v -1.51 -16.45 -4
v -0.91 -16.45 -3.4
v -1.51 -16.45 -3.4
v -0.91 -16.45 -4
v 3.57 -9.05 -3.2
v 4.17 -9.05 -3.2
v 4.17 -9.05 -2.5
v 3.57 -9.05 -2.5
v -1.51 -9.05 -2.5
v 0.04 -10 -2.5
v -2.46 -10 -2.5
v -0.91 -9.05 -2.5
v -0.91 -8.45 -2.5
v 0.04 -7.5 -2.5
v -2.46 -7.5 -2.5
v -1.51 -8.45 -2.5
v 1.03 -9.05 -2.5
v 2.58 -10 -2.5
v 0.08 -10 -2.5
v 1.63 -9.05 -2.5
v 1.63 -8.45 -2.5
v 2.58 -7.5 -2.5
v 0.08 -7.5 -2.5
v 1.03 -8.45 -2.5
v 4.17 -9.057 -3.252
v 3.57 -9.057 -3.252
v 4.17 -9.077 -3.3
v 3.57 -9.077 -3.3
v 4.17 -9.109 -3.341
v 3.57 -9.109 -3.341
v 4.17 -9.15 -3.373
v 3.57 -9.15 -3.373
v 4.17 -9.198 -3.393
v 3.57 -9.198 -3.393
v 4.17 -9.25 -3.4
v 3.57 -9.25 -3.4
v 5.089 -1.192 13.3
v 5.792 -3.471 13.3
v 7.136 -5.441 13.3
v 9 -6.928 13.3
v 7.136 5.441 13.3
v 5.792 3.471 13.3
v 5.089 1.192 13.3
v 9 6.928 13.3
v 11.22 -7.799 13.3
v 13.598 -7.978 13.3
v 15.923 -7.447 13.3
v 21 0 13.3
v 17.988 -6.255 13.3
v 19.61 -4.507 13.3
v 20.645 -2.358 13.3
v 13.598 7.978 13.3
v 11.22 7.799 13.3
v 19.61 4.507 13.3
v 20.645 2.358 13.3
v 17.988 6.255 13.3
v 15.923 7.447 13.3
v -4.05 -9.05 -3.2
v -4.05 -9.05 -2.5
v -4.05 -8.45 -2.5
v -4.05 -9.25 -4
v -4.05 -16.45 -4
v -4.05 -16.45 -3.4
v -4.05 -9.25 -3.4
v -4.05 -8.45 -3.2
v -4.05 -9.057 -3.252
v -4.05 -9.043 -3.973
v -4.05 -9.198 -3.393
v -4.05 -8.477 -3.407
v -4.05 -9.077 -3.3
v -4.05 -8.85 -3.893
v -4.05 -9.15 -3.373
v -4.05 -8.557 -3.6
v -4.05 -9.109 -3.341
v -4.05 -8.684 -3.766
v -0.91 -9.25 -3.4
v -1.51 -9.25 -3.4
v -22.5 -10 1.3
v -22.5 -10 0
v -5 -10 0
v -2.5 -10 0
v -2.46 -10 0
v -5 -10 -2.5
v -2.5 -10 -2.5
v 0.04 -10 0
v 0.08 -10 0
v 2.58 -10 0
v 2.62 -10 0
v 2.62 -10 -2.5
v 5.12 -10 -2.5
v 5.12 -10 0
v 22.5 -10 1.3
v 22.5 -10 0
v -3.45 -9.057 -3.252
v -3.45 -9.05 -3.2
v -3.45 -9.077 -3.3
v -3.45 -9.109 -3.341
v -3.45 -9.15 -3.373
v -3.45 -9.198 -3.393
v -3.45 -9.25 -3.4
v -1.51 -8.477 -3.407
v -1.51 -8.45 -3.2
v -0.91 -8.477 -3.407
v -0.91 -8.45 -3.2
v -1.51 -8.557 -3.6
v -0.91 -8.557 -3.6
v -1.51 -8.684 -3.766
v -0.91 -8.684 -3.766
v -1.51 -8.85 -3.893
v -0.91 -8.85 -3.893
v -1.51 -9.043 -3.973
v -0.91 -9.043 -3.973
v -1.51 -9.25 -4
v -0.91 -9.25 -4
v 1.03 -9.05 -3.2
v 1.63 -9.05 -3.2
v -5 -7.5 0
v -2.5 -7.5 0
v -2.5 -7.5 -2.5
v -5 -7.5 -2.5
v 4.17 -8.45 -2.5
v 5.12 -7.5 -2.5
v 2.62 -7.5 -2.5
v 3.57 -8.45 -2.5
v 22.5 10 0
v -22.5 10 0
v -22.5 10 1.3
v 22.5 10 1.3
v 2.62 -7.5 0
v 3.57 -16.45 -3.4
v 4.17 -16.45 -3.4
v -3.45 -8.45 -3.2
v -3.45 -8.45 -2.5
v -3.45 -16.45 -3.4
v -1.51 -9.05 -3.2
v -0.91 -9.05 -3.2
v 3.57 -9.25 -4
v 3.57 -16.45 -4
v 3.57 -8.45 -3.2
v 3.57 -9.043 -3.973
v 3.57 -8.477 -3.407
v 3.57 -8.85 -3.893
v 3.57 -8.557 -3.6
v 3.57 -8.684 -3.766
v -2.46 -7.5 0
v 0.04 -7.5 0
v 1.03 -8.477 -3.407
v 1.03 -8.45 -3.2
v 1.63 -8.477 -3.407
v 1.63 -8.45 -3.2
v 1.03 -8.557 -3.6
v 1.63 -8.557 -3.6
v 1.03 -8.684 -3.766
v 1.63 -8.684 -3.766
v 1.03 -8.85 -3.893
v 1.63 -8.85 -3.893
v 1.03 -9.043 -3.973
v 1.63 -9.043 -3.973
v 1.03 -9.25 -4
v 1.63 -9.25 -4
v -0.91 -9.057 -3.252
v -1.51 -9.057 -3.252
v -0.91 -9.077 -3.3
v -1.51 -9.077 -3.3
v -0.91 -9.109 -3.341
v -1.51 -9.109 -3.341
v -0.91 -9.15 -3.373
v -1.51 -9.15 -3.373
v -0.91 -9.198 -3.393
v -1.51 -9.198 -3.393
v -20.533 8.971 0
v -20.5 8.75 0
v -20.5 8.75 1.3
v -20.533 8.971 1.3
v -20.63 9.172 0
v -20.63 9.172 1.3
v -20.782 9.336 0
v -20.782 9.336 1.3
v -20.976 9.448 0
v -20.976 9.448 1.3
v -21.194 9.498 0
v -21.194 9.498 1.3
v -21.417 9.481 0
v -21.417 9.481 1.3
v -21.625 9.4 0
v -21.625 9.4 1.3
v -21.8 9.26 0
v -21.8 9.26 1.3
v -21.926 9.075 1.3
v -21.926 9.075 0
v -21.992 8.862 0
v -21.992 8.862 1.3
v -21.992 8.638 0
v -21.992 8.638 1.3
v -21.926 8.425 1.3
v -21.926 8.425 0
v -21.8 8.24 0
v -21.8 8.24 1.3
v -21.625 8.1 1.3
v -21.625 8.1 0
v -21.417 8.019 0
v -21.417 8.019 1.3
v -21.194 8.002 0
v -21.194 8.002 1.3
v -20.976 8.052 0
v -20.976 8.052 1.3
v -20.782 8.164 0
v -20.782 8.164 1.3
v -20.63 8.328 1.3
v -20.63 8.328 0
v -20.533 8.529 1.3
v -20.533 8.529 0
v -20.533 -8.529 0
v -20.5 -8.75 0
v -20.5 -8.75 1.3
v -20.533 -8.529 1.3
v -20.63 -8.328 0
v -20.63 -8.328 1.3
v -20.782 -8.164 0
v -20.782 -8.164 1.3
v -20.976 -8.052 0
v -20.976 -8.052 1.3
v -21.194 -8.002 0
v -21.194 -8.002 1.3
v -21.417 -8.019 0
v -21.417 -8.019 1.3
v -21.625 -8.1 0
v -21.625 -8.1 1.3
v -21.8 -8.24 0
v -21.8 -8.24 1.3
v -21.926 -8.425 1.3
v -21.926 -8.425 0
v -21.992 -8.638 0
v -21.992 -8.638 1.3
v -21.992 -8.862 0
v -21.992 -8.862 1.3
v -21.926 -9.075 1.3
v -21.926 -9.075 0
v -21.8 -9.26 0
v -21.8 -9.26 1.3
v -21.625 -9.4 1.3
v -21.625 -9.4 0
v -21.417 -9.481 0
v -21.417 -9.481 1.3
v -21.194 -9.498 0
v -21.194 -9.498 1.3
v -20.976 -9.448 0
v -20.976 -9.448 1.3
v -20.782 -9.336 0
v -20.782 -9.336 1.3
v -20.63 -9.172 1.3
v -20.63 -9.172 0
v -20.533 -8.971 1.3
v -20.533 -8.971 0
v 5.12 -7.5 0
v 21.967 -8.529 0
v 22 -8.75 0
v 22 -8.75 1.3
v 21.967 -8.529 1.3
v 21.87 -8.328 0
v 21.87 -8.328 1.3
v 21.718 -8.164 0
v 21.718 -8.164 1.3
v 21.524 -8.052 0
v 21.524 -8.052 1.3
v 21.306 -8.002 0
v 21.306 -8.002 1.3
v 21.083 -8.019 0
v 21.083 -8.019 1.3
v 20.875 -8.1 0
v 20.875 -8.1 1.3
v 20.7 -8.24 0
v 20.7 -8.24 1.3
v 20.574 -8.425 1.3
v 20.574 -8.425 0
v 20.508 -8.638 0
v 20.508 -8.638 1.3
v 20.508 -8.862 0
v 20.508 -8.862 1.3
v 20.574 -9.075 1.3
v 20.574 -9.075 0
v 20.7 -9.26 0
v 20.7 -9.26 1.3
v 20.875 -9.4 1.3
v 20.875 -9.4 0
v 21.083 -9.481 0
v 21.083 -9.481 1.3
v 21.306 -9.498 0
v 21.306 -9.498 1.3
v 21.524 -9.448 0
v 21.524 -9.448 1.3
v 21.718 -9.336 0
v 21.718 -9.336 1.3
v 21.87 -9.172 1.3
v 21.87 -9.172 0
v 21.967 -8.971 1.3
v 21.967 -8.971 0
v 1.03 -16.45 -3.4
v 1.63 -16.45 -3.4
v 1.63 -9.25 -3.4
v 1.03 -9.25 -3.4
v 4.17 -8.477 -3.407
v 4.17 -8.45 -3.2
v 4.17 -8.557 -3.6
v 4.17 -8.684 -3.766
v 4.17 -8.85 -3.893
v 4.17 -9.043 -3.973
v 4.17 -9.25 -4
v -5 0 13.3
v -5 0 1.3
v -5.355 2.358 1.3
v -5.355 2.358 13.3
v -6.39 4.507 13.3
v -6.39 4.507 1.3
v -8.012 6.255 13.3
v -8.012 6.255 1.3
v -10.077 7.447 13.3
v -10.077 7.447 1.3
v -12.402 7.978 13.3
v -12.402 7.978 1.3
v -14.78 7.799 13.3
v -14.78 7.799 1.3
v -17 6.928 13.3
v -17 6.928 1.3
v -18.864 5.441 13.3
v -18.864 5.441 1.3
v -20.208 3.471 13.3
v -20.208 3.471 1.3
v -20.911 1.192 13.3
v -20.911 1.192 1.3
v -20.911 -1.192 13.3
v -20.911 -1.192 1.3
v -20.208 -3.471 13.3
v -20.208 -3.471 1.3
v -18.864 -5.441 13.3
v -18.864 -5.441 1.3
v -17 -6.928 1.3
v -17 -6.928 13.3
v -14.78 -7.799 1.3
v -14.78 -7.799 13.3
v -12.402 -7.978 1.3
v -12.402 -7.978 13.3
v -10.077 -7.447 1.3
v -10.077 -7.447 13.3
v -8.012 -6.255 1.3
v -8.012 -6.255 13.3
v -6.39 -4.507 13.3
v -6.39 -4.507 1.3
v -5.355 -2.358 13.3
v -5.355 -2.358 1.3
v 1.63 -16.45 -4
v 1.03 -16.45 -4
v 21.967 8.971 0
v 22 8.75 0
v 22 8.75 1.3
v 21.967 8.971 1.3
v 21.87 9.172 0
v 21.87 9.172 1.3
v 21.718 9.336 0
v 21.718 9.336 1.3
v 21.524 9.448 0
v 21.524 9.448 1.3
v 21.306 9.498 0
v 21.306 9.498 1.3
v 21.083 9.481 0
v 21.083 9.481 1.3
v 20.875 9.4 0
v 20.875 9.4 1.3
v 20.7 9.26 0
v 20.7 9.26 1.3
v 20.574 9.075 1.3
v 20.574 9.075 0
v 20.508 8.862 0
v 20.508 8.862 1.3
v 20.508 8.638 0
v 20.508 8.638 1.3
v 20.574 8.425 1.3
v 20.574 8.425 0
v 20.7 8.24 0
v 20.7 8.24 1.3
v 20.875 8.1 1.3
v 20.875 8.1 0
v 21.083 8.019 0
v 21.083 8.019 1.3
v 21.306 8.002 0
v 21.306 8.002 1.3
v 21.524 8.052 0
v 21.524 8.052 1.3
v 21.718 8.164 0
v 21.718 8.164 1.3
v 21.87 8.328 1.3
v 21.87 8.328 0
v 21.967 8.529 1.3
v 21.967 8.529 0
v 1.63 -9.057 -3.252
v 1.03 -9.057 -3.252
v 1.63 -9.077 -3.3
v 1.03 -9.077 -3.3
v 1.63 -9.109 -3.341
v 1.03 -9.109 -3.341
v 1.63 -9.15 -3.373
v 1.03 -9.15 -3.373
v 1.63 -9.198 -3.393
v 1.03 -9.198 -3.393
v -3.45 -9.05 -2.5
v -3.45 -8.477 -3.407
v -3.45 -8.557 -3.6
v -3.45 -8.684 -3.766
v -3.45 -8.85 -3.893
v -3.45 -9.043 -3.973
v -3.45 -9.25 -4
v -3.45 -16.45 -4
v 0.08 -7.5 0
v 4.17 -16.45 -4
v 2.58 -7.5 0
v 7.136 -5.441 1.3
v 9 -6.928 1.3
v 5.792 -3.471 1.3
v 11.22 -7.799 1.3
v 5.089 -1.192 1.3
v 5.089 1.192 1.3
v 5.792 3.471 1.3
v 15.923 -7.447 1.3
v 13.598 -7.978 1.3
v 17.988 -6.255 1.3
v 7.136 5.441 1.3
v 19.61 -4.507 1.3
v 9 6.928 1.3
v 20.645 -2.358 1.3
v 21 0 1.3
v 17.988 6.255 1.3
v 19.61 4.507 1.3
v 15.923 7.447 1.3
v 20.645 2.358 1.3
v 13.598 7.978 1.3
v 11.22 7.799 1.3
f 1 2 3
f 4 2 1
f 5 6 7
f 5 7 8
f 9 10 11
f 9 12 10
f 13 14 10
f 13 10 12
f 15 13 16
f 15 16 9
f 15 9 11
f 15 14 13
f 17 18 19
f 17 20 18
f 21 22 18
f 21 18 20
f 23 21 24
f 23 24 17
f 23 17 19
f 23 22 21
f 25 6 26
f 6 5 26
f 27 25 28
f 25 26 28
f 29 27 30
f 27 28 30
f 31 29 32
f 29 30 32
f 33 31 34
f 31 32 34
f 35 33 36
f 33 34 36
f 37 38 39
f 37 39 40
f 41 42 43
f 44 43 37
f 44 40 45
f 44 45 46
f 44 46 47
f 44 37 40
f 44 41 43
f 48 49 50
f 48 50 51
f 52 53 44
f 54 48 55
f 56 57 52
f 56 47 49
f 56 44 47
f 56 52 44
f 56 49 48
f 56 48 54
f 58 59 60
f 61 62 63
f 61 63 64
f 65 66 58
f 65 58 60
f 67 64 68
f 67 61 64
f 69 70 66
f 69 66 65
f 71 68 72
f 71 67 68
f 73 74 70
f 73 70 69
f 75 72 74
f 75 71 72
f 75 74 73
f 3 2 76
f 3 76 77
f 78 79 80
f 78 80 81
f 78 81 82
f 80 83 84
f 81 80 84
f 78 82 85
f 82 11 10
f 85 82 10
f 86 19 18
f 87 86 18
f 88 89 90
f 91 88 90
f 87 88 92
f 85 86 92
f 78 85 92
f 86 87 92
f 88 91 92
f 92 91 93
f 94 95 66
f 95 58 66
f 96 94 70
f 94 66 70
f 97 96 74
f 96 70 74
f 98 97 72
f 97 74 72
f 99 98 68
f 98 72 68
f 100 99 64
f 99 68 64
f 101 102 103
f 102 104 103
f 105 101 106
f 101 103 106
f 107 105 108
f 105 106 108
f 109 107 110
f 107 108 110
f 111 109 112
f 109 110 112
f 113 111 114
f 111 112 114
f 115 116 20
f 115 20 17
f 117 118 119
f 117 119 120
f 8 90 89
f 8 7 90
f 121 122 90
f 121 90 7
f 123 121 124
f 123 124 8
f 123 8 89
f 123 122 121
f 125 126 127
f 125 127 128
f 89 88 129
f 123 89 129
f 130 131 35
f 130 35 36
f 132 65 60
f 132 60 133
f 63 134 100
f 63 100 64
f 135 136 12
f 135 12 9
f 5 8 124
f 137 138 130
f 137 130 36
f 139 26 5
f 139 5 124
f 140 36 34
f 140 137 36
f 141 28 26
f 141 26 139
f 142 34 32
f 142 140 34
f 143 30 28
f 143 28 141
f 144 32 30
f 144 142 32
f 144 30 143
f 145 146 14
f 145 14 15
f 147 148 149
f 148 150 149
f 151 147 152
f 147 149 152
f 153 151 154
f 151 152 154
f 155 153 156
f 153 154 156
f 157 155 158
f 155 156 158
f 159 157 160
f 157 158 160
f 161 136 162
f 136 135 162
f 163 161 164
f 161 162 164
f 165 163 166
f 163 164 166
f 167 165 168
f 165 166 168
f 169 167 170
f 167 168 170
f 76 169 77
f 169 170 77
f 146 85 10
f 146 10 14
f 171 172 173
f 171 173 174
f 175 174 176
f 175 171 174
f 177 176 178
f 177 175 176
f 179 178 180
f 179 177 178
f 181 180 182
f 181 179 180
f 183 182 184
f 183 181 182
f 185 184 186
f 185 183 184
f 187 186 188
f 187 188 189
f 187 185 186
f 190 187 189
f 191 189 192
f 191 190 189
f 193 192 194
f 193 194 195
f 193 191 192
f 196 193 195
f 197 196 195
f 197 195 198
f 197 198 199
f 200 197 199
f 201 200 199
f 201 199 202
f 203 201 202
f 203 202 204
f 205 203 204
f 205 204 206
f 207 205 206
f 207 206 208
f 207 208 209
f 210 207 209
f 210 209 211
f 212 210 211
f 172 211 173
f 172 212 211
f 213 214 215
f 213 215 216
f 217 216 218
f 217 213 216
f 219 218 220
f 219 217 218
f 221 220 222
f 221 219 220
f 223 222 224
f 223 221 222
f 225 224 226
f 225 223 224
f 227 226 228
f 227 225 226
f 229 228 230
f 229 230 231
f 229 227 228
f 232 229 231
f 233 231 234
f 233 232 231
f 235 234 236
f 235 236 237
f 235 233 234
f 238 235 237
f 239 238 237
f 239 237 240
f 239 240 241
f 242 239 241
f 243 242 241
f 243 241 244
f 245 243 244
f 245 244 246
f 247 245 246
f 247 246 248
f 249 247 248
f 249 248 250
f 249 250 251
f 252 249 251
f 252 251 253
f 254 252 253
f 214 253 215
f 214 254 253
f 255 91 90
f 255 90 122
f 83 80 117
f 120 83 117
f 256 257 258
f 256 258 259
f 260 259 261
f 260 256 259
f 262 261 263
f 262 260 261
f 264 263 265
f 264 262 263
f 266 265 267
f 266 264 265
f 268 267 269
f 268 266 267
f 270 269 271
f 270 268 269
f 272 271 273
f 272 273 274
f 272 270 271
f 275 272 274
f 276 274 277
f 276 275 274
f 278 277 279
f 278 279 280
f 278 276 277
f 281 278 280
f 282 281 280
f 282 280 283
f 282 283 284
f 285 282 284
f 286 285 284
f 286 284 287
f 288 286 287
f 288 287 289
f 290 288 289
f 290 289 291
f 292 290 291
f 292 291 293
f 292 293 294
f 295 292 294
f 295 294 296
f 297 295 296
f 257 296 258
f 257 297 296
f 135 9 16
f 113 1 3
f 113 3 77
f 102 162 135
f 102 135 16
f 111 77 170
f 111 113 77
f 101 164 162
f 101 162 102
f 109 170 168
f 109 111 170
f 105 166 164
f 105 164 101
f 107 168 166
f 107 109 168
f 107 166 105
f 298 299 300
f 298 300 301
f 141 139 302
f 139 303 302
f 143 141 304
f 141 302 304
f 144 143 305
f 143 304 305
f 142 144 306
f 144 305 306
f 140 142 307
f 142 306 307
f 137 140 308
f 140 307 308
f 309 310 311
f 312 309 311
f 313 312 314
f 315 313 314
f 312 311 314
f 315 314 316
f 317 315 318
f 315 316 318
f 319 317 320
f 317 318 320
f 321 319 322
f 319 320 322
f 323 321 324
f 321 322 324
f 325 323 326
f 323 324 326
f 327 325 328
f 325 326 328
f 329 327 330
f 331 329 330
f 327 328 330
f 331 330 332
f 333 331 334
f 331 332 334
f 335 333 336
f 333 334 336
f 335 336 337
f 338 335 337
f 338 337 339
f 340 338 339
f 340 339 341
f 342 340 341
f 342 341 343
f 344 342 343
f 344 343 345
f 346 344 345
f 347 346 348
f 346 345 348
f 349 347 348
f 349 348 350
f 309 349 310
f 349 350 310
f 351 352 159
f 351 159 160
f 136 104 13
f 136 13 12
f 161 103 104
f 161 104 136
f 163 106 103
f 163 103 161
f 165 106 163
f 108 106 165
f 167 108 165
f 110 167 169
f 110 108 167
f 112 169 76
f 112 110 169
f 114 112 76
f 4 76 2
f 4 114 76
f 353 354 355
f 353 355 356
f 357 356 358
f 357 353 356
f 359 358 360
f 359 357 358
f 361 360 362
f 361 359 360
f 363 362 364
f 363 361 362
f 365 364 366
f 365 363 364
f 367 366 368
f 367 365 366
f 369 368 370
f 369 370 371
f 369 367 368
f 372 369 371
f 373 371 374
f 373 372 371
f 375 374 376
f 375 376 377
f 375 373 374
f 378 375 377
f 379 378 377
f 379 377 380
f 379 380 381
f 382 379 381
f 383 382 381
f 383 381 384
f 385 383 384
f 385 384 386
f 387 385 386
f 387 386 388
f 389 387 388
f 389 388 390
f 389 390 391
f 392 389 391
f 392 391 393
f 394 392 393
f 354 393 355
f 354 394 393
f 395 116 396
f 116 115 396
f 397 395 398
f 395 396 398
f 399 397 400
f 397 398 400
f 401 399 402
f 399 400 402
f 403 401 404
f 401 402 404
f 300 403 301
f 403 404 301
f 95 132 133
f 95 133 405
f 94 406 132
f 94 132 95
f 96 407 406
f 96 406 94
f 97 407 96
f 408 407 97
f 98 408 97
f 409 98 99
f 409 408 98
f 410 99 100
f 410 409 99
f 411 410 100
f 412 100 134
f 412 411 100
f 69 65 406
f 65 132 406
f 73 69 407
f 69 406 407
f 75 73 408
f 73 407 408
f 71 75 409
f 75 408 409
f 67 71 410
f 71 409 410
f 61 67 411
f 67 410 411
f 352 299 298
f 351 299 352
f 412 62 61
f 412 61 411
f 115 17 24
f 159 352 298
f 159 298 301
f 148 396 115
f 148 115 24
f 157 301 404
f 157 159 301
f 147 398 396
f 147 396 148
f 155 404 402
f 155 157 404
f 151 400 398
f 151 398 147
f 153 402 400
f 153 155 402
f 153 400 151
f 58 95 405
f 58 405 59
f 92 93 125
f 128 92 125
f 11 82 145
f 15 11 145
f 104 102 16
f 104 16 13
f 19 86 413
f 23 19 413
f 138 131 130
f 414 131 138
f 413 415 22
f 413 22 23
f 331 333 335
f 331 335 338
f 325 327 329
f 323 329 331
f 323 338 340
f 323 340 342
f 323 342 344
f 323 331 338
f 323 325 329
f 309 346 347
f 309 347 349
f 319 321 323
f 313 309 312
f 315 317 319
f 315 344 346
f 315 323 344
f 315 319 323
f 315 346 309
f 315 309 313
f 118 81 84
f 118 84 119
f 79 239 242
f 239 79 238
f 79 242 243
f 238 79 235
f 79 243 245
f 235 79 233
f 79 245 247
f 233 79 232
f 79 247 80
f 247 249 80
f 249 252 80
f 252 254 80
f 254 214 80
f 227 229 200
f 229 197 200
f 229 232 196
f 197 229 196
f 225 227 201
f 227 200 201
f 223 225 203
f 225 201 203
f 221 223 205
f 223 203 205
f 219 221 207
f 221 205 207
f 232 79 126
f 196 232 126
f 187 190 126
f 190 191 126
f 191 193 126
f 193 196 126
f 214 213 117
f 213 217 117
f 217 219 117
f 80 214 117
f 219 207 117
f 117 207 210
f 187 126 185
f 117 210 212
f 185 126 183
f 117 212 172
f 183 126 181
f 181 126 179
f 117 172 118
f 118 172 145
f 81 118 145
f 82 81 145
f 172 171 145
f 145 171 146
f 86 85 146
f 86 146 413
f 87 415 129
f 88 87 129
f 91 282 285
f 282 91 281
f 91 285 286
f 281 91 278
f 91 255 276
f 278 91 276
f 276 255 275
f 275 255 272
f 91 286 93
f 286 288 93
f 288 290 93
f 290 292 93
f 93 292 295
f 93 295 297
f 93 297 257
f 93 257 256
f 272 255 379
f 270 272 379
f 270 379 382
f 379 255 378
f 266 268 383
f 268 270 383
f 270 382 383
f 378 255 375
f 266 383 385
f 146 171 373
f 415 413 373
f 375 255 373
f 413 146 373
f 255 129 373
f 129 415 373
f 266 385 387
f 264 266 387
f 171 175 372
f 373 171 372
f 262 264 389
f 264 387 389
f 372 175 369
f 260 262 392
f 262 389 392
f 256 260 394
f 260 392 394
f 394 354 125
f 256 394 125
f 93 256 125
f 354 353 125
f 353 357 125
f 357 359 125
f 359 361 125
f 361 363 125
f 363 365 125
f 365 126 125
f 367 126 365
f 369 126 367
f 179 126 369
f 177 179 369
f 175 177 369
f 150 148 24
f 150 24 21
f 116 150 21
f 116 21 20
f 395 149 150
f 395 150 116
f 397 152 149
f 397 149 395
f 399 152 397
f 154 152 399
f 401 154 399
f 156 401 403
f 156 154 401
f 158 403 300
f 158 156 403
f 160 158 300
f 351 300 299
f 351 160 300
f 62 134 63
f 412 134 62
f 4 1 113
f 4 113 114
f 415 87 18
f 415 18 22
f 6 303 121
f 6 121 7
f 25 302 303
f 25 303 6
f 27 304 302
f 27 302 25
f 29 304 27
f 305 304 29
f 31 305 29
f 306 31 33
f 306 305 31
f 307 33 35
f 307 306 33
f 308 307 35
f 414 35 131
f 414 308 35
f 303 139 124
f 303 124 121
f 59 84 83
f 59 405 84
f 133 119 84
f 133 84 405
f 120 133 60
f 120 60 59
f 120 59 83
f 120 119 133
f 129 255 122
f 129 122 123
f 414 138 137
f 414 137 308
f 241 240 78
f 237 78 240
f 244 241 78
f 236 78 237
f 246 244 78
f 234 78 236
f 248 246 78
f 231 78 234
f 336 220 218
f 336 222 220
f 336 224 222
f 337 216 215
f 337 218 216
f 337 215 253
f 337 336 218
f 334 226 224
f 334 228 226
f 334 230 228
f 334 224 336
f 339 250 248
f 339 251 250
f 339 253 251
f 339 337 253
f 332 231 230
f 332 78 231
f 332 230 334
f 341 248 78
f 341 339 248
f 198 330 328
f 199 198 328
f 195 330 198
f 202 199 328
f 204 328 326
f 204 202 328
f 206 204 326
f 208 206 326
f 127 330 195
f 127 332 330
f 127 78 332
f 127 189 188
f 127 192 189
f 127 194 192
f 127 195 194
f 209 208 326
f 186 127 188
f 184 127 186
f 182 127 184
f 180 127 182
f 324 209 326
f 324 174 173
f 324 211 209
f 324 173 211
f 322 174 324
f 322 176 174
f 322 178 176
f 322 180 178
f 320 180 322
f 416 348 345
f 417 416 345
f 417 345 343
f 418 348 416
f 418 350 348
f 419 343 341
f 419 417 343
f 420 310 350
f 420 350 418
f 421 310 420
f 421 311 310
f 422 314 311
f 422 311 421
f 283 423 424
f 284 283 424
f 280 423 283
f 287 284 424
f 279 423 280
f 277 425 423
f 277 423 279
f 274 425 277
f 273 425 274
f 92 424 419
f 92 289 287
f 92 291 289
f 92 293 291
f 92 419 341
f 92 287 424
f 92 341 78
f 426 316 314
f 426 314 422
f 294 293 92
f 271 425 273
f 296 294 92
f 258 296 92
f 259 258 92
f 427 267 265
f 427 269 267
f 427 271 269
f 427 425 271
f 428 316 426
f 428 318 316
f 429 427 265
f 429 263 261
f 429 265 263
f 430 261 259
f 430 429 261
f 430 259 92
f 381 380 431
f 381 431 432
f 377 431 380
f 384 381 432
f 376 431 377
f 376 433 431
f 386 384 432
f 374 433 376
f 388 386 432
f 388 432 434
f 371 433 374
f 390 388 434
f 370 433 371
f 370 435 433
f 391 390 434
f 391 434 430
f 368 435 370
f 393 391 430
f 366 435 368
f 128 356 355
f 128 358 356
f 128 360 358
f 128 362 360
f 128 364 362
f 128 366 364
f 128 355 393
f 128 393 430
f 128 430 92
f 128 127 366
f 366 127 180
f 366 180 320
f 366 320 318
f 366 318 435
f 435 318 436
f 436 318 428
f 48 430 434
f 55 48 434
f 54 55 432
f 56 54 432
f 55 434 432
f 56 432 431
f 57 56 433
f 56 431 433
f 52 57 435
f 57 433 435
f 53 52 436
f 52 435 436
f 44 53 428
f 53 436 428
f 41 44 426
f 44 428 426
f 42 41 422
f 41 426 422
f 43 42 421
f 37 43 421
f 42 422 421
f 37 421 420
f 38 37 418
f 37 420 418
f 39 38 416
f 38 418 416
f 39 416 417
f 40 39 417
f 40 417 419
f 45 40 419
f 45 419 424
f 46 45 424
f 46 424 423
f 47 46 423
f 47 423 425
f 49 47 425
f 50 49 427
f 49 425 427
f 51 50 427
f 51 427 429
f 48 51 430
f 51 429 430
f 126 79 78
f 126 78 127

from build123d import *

# Parameters (mm, degrees)
SKETCH_1_W             = 45
SKETCH_1_H             = 20
SKETCH_1_R             = 0.75
EXTRUDE_1_DEPTH        = 1.3
SKETCH_2_R             = 8
EXTRUDE_2_DEPTH        = 12
SKETCH_3_W             = 2.5
SKETCH_3_H             = 2.5
EXTRUDE_3_DEPTH        = 2.5
SKETCH_5_W             = 0.6
SKETCH_5_H             = 0.6
PATTERN_LINEAR_3_COUNT = 4
PATTERN_LINEAR_3_PITCH = 2.54


with BuildPart() as part:
    # 草图1 → 凸台-拉伸1 (new body)
    with BuildSketch(Plane.XY):
        Rectangle(SKETCH_1_W, SKETCH_1_H)
        with Locations((-21.25, 8.75)):
            Circle(SKETCH_1_R, mode=Mode.SUBTRACT)
        with Locations((21.25, 8.75)):
            Circle(SKETCH_1_R, mode=Mode.SUBTRACT)
        with Locations((21.25, -8.75)):
            Circle(SKETCH_1_R, mode=Mode.SUBTRACT)
        with Locations((-21.25, -8.75)):
            Circle(SKETCH_1_R, mode=Mode.SUBTRACT)
    extrude(amount=EXTRUDE_1_DEPTH)

    # 草图2 → 凸台-拉伸2 (add)
    with BuildSketch(Plane.XY.offset(1.3)):
        with Locations((-13, 0)):
            Circle(SKETCH_2_R)
        with Locations((13, 0)):
            Circle(SKETCH_2_R)
    extrude(amount=EXTRUDE_2_DEPTH)

    # 草图3 → 凸台-拉伸3 (add)
    with BuildSketch(Plane(origin=(0, 0, 0), x_dir=(-1, 0, 0), z_dir=(0, 0, -1))):
        with Locations((3.75, -8.75)):
            Rectangle(SKETCH_3_W, SKETCH_3_H)
    extrude_3 = extrude(amount=EXTRUDE_3_DEPTH)

    # 扫描1: sweep along a path in 草图4
    with BuildLine(Plane.ZY.offset(3.75)) as sweep_1_path:
        Line((-2.5, -8.75), (-3.2, -8.75))
        ThreePointArc((-3.2, -8.75), (-3.553553391, -8.896446609), (-3.7, -9.25))
        Line((-3.7, -9.25), (-3.7, -16.45))
    # 草图5 → 扫描1 (sweep)
    with BuildSketch(Plane(origin=(0, 0, -2.5), x_dir=(-1, 0, 0), z_dir=(0, 0, -1))):
        with Locations((3.75, -8.75)):
            Rectangle(SKETCH_5_W, SKETCH_5_H)
    sweep_1 = sweep(path=sweep_1_path.line)

    # 阵列(线性)3: 凸台-拉伸3, 扫描1 ×4
    with Locations(*[(i * PATTERN_LINEAR_3_PITCH, 0, 0) for i in range(1, PATTERN_LINEAR_3_COUNT)]):
        add(extrude_3)
        add(sweep_1)


solid = part.part
